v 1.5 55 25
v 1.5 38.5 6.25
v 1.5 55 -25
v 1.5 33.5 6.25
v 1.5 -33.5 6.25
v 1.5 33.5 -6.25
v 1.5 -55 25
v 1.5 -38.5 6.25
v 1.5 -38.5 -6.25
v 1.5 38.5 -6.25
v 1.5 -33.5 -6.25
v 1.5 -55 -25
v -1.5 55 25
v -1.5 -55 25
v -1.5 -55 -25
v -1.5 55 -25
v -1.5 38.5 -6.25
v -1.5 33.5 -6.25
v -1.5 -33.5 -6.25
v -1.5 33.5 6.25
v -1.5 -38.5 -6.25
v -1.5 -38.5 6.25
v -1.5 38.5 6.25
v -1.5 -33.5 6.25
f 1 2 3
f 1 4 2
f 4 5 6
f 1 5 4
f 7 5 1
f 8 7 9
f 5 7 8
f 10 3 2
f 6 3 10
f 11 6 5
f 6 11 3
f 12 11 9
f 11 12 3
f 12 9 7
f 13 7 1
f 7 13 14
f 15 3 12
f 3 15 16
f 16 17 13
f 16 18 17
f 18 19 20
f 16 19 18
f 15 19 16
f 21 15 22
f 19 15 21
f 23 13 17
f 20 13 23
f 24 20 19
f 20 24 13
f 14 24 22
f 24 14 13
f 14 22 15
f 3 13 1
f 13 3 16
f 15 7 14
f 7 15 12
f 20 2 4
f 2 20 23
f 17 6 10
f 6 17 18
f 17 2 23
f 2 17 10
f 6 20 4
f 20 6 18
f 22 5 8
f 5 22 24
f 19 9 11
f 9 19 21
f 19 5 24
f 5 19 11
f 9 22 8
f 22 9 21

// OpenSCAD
// Front blade of a sumo-jr dozer

difference() {
   cube([3, 110, 50 ], center=true);
   translate([0,67/2 + 5/2,0]) cube([20,5,12.5], center=true);
   translate([0,-(67/2 + 5/2),0]) cube([20,5,12.5], center=true);
}
